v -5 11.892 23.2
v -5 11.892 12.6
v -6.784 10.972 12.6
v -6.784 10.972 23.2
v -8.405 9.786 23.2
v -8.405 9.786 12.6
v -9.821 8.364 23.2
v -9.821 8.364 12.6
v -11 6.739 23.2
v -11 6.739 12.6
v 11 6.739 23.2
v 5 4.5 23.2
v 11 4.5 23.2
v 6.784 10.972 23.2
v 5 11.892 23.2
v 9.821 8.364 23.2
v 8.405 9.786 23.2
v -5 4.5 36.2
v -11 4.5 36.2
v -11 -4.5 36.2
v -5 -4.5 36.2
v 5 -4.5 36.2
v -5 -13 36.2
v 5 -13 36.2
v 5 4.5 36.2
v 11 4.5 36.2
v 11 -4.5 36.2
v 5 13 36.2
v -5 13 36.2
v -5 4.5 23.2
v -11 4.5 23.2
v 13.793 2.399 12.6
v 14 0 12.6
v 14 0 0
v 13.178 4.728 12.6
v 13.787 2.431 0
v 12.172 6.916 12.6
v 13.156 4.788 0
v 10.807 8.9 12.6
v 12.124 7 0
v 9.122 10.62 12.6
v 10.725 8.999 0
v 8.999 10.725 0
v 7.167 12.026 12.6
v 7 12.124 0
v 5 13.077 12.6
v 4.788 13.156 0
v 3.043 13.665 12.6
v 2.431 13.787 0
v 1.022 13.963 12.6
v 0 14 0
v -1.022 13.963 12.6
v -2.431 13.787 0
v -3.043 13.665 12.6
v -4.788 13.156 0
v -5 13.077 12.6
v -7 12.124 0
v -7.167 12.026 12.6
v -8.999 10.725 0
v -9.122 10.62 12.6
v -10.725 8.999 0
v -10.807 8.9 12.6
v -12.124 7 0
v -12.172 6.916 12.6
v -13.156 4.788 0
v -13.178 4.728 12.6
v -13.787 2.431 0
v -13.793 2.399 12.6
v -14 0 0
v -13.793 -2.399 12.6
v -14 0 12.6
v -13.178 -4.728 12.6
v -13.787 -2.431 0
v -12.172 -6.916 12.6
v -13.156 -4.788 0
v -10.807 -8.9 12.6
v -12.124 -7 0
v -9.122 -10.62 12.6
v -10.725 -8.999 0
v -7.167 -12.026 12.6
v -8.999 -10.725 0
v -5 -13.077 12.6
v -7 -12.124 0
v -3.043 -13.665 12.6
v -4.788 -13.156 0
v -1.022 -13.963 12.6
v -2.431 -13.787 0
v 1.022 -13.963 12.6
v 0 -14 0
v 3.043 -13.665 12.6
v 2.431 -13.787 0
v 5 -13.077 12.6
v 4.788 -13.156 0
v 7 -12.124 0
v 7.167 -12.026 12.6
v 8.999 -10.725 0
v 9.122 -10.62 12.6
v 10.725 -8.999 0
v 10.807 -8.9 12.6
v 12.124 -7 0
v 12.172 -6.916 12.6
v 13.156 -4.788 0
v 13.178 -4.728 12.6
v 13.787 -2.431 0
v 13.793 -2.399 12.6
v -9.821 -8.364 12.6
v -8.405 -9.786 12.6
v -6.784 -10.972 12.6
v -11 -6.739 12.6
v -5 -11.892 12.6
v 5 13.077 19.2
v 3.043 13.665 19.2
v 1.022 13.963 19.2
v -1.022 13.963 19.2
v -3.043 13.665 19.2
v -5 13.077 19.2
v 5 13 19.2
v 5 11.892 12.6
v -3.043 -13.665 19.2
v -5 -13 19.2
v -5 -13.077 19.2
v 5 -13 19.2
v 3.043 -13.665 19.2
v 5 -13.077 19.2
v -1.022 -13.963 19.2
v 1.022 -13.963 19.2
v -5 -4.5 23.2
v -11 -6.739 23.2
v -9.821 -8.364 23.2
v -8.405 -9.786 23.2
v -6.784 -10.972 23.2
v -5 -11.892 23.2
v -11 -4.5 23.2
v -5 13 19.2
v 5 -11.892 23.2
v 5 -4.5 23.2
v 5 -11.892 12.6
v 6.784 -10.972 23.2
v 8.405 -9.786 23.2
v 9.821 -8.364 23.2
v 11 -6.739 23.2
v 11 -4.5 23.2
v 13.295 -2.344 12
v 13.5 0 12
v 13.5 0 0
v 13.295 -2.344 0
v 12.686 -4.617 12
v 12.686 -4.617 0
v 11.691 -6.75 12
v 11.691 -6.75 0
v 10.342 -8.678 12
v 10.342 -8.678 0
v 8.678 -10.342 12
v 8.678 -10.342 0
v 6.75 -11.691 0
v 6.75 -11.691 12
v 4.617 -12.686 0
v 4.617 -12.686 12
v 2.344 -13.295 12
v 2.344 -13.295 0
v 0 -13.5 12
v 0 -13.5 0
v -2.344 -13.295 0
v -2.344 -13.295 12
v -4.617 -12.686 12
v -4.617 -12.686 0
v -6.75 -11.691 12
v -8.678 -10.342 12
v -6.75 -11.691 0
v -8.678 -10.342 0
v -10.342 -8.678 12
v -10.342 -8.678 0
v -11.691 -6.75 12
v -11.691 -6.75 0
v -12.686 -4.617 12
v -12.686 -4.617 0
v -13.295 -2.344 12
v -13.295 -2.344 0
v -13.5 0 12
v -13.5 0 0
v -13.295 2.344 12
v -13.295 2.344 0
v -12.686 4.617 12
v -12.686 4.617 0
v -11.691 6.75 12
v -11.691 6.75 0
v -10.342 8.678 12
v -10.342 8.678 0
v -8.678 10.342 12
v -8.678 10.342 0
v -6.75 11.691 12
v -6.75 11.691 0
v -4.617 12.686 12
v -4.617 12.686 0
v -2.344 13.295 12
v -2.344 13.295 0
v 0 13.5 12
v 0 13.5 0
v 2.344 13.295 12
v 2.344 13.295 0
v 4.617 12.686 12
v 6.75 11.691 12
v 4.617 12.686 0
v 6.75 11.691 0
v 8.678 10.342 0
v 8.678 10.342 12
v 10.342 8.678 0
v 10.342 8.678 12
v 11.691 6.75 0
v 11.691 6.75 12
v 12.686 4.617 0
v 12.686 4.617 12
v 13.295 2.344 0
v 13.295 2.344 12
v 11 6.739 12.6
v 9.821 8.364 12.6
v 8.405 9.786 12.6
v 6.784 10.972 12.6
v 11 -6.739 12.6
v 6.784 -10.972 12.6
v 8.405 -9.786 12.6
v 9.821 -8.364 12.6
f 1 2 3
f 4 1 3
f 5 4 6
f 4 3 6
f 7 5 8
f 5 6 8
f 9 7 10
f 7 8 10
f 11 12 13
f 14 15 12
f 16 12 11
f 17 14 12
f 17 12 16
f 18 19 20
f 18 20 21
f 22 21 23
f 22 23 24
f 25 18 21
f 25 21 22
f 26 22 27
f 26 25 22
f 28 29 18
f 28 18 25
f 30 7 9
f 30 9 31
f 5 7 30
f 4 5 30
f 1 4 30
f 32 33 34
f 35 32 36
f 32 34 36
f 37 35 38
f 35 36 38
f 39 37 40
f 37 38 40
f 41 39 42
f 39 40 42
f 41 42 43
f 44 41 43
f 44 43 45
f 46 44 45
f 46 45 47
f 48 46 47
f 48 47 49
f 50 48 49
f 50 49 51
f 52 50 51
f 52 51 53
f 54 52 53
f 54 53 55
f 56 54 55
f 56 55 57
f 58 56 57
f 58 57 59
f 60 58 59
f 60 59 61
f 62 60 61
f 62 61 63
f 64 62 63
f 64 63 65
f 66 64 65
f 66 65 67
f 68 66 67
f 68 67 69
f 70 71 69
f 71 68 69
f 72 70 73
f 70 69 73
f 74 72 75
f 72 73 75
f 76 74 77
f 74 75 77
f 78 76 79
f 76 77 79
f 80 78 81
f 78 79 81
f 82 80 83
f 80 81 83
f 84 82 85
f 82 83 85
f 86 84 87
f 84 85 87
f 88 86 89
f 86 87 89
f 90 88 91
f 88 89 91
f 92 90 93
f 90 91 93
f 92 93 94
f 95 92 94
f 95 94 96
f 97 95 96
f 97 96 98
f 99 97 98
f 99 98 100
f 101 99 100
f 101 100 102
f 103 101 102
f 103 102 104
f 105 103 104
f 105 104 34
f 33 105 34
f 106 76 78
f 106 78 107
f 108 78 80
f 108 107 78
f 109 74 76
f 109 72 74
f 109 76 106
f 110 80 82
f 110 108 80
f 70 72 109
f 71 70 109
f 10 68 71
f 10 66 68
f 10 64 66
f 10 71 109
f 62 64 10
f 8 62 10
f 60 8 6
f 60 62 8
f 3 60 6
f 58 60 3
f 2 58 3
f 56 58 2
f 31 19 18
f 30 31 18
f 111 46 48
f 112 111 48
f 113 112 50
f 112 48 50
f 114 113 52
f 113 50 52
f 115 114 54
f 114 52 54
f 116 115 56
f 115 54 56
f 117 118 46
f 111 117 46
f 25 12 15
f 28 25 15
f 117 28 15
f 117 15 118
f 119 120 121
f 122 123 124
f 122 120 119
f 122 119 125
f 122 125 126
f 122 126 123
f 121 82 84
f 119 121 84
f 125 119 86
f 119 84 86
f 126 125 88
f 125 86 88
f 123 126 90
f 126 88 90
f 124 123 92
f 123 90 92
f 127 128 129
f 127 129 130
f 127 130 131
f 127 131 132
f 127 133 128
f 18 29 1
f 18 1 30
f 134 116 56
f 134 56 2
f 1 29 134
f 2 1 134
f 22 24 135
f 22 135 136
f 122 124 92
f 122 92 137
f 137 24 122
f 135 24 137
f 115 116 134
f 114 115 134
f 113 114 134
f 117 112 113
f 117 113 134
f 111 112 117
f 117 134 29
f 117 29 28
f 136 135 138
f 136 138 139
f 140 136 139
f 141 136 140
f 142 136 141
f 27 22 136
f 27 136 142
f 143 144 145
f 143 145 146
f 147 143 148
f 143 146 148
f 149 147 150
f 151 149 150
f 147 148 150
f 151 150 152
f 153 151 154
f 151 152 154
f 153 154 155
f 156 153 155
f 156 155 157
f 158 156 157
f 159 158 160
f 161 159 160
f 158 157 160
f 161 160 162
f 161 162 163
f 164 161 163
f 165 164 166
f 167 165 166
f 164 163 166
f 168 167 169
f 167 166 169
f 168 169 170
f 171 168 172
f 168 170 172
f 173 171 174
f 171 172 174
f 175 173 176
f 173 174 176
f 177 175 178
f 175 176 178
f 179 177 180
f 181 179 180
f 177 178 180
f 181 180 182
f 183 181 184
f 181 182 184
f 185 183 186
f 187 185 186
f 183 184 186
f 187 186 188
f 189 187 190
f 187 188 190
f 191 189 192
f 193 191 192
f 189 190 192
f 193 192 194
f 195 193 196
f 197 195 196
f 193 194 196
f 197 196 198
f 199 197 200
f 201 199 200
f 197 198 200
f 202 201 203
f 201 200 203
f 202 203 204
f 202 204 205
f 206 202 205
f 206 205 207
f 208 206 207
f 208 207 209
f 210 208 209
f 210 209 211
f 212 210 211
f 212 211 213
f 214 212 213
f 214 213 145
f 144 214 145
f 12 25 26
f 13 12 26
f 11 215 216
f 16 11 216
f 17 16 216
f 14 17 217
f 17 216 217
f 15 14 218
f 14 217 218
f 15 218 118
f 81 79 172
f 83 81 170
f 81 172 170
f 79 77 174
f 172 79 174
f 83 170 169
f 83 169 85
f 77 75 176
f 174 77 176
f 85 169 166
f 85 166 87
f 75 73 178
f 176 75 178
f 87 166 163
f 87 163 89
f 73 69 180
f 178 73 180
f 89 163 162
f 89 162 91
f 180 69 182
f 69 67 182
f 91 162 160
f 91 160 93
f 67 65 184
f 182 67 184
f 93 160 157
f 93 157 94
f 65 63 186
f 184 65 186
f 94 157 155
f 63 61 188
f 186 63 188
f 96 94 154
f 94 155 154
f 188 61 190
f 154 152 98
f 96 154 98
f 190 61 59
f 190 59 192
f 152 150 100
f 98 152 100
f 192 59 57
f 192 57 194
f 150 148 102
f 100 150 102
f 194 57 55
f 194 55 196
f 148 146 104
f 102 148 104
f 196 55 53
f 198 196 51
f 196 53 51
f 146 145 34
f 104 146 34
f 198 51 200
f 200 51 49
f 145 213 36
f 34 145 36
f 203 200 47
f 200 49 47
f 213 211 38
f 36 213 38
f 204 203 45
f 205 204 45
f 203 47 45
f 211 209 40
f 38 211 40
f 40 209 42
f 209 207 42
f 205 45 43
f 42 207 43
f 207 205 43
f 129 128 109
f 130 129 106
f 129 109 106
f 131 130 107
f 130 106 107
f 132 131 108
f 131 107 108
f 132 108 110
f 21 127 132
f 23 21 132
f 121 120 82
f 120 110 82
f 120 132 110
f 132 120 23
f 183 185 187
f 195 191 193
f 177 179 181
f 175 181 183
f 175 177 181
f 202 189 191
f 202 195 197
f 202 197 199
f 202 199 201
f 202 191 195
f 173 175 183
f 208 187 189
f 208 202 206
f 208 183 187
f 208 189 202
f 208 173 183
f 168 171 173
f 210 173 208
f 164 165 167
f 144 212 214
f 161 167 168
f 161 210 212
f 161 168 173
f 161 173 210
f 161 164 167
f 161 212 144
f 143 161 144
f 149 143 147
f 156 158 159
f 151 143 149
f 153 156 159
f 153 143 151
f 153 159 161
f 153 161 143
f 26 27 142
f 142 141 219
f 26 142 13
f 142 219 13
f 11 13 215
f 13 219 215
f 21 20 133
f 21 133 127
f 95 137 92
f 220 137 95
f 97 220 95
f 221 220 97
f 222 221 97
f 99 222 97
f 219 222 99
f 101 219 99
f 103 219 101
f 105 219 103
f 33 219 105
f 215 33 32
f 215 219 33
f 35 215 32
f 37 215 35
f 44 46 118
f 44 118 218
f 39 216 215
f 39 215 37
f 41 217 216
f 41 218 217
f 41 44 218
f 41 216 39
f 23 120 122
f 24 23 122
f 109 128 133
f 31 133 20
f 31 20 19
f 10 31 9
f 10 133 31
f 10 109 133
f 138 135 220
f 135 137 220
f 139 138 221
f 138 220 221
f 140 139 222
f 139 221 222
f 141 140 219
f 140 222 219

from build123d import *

# Parameters (mm, degrees)
F0_R          = 14
F1_DEPTH      = 12.6
F2_R          = 12.9
F3_DEPTH      = 10.6
F5_DEPTH      = 10.6
F6_W          = 6
F6_H          = 9
F6_W_2        = 10
F6_H_2        = 8.5
F7_DEPTH      = 13
F7_DEPTH_BACK = 12
F9_DEPTH      = 6.6
F10_R         = 13.5
F11_DEPTH     = 12


with BuildPart() as f1:
    # F0 (on Top) → F1 (new body)
    with BuildSketch(Plane.XY):
        Circle(F0_R)
    extrude(amount=F1_DEPTH)

    # F2 (on face) → F3 (join)
    with BuildSketch(Plane.XY.offset(12.6)):
        Circle(F2_R)
    extrude(amount=F3_DEPTH)

    # F4 (on face) → F5 (cut)
    with BuildSketch(Plane.XY.offset(23.2)):
        with BuildLine():
            Line((19.0122332424, 15.1731111109), (11, 15.1731111109))
            Line((11, 15.1731111109), (11, 6.7386942355))
            ThreePointArc((11, 6.7386942355), (12.4159172033, 3.5007142128), (12.9, 0))
            ThreePointArc((12.9, 0), (12.4159172033, -3.5007142128), (11, -6.7386942355))
            Line((11, -6.7386942355), (11, -15.1731111109))
            Line((11, -15.1731111109), (19.0122332424, -15.1731111109))
            Line((19.0122332424, -15.1731111109), (19.0122332424, 15.1731111109))
        make_face()
        with BuildLine():
            Line((-11, -6.7386942355), (-11, 6.7386942355))
            ThreePointArc((-11, 6.7386942355), (-12.9, 0), (-11, -6.7386942355))
        make_face()
        with BuildLine():
            Line((-11, 6.7386942355), (-11, 13.9122297987))
            Line((-11, 13.9122297987), (-20.8380557597, 13.9122297987))
            Line((-20.8380557597, 13.9122297987), (-20.8380557597, -13.9122297987))
            Line((-20.8380557597, -13.9122297987), (-11, -13.9122297987))
            Line((-11, -13.9122297987), (-11, -6.7386942355))
            ThreePointArc((-11, -6.7386942355), (-12.9, 0), (-11, 6.7386942355))
        make_face()
        with BuildLine():
            ThreePointArc((12.9, 0), (12.4159172033, 3.5007142128), (11, 6.7386942355))
            Line((11, 6.7386942355), (11, -6.7386942355))
            ThreePointArc((11, -6.7386942355), (12.4159172033, -3.5007142128), (12.9, 0))
        make_face()
    extrude(amount=-F5_DEPTH, mode=Mode.SUBTRACT)

    # F6 (on face) → F7 (join, two sides)
    with BuildSketch(Plane.XY.offset(23.2)) as f7_sk:
        with Locations((-8, 0)):
            Rectangle(F6_W, F6_H)
        with Locations((0, 8.75)):
            Rectangle(F6_W_2, F6_H_2)
        Rectangle(F6_W_2, F6_H)
        with Locations((8, 0)):
            Rectangle(F6_W, F6_H)
        with Locations((0, -8.75)):
            Rectangle(F6_W_2, F6_H_2)
    extrude(amount=F7_DEPTH)
    extrude(f7_sk.sketch, amount=-F7_DEPTH_BACK)

    # F8 (on face) → F9 (join)
    with BuildSketch(Plane.XY.offset(12.6)):
        with BuildLine():
            Line((5, -13), (-5, -13))
            Line((-5, -13), (-5, -13.0766968306))
            ThreePointArc((-5, -13.0766968306), (0, -14), (5, -13.0766968306))
            Line((5, -13.0766968306), (5, -13))
        make_face()
        with BuildLine():
            ThreePointArc((5, 13.0766968306), (0, 14), (-5, 13.0766968306))
            Line((-5, 13.0766968306), (-5, 13))
            Line((-5, 13), (5, 13))
            Line((5, 13), (5, 13.0766968306))
        make_face()
    extrude(amount=F9_DEPTH)

    # F10 (on face) → F11 (cut)
    with BuildSketch(Plane(origin=(0, 0, 0), x_dir=(1, 0, 0), z_dir=(0, 0, -1))):
        Circle(F10_R)
    extrude(amount=-F11_DEPTH, mode=Mode.SUBTRACT)


solid = f1.part
